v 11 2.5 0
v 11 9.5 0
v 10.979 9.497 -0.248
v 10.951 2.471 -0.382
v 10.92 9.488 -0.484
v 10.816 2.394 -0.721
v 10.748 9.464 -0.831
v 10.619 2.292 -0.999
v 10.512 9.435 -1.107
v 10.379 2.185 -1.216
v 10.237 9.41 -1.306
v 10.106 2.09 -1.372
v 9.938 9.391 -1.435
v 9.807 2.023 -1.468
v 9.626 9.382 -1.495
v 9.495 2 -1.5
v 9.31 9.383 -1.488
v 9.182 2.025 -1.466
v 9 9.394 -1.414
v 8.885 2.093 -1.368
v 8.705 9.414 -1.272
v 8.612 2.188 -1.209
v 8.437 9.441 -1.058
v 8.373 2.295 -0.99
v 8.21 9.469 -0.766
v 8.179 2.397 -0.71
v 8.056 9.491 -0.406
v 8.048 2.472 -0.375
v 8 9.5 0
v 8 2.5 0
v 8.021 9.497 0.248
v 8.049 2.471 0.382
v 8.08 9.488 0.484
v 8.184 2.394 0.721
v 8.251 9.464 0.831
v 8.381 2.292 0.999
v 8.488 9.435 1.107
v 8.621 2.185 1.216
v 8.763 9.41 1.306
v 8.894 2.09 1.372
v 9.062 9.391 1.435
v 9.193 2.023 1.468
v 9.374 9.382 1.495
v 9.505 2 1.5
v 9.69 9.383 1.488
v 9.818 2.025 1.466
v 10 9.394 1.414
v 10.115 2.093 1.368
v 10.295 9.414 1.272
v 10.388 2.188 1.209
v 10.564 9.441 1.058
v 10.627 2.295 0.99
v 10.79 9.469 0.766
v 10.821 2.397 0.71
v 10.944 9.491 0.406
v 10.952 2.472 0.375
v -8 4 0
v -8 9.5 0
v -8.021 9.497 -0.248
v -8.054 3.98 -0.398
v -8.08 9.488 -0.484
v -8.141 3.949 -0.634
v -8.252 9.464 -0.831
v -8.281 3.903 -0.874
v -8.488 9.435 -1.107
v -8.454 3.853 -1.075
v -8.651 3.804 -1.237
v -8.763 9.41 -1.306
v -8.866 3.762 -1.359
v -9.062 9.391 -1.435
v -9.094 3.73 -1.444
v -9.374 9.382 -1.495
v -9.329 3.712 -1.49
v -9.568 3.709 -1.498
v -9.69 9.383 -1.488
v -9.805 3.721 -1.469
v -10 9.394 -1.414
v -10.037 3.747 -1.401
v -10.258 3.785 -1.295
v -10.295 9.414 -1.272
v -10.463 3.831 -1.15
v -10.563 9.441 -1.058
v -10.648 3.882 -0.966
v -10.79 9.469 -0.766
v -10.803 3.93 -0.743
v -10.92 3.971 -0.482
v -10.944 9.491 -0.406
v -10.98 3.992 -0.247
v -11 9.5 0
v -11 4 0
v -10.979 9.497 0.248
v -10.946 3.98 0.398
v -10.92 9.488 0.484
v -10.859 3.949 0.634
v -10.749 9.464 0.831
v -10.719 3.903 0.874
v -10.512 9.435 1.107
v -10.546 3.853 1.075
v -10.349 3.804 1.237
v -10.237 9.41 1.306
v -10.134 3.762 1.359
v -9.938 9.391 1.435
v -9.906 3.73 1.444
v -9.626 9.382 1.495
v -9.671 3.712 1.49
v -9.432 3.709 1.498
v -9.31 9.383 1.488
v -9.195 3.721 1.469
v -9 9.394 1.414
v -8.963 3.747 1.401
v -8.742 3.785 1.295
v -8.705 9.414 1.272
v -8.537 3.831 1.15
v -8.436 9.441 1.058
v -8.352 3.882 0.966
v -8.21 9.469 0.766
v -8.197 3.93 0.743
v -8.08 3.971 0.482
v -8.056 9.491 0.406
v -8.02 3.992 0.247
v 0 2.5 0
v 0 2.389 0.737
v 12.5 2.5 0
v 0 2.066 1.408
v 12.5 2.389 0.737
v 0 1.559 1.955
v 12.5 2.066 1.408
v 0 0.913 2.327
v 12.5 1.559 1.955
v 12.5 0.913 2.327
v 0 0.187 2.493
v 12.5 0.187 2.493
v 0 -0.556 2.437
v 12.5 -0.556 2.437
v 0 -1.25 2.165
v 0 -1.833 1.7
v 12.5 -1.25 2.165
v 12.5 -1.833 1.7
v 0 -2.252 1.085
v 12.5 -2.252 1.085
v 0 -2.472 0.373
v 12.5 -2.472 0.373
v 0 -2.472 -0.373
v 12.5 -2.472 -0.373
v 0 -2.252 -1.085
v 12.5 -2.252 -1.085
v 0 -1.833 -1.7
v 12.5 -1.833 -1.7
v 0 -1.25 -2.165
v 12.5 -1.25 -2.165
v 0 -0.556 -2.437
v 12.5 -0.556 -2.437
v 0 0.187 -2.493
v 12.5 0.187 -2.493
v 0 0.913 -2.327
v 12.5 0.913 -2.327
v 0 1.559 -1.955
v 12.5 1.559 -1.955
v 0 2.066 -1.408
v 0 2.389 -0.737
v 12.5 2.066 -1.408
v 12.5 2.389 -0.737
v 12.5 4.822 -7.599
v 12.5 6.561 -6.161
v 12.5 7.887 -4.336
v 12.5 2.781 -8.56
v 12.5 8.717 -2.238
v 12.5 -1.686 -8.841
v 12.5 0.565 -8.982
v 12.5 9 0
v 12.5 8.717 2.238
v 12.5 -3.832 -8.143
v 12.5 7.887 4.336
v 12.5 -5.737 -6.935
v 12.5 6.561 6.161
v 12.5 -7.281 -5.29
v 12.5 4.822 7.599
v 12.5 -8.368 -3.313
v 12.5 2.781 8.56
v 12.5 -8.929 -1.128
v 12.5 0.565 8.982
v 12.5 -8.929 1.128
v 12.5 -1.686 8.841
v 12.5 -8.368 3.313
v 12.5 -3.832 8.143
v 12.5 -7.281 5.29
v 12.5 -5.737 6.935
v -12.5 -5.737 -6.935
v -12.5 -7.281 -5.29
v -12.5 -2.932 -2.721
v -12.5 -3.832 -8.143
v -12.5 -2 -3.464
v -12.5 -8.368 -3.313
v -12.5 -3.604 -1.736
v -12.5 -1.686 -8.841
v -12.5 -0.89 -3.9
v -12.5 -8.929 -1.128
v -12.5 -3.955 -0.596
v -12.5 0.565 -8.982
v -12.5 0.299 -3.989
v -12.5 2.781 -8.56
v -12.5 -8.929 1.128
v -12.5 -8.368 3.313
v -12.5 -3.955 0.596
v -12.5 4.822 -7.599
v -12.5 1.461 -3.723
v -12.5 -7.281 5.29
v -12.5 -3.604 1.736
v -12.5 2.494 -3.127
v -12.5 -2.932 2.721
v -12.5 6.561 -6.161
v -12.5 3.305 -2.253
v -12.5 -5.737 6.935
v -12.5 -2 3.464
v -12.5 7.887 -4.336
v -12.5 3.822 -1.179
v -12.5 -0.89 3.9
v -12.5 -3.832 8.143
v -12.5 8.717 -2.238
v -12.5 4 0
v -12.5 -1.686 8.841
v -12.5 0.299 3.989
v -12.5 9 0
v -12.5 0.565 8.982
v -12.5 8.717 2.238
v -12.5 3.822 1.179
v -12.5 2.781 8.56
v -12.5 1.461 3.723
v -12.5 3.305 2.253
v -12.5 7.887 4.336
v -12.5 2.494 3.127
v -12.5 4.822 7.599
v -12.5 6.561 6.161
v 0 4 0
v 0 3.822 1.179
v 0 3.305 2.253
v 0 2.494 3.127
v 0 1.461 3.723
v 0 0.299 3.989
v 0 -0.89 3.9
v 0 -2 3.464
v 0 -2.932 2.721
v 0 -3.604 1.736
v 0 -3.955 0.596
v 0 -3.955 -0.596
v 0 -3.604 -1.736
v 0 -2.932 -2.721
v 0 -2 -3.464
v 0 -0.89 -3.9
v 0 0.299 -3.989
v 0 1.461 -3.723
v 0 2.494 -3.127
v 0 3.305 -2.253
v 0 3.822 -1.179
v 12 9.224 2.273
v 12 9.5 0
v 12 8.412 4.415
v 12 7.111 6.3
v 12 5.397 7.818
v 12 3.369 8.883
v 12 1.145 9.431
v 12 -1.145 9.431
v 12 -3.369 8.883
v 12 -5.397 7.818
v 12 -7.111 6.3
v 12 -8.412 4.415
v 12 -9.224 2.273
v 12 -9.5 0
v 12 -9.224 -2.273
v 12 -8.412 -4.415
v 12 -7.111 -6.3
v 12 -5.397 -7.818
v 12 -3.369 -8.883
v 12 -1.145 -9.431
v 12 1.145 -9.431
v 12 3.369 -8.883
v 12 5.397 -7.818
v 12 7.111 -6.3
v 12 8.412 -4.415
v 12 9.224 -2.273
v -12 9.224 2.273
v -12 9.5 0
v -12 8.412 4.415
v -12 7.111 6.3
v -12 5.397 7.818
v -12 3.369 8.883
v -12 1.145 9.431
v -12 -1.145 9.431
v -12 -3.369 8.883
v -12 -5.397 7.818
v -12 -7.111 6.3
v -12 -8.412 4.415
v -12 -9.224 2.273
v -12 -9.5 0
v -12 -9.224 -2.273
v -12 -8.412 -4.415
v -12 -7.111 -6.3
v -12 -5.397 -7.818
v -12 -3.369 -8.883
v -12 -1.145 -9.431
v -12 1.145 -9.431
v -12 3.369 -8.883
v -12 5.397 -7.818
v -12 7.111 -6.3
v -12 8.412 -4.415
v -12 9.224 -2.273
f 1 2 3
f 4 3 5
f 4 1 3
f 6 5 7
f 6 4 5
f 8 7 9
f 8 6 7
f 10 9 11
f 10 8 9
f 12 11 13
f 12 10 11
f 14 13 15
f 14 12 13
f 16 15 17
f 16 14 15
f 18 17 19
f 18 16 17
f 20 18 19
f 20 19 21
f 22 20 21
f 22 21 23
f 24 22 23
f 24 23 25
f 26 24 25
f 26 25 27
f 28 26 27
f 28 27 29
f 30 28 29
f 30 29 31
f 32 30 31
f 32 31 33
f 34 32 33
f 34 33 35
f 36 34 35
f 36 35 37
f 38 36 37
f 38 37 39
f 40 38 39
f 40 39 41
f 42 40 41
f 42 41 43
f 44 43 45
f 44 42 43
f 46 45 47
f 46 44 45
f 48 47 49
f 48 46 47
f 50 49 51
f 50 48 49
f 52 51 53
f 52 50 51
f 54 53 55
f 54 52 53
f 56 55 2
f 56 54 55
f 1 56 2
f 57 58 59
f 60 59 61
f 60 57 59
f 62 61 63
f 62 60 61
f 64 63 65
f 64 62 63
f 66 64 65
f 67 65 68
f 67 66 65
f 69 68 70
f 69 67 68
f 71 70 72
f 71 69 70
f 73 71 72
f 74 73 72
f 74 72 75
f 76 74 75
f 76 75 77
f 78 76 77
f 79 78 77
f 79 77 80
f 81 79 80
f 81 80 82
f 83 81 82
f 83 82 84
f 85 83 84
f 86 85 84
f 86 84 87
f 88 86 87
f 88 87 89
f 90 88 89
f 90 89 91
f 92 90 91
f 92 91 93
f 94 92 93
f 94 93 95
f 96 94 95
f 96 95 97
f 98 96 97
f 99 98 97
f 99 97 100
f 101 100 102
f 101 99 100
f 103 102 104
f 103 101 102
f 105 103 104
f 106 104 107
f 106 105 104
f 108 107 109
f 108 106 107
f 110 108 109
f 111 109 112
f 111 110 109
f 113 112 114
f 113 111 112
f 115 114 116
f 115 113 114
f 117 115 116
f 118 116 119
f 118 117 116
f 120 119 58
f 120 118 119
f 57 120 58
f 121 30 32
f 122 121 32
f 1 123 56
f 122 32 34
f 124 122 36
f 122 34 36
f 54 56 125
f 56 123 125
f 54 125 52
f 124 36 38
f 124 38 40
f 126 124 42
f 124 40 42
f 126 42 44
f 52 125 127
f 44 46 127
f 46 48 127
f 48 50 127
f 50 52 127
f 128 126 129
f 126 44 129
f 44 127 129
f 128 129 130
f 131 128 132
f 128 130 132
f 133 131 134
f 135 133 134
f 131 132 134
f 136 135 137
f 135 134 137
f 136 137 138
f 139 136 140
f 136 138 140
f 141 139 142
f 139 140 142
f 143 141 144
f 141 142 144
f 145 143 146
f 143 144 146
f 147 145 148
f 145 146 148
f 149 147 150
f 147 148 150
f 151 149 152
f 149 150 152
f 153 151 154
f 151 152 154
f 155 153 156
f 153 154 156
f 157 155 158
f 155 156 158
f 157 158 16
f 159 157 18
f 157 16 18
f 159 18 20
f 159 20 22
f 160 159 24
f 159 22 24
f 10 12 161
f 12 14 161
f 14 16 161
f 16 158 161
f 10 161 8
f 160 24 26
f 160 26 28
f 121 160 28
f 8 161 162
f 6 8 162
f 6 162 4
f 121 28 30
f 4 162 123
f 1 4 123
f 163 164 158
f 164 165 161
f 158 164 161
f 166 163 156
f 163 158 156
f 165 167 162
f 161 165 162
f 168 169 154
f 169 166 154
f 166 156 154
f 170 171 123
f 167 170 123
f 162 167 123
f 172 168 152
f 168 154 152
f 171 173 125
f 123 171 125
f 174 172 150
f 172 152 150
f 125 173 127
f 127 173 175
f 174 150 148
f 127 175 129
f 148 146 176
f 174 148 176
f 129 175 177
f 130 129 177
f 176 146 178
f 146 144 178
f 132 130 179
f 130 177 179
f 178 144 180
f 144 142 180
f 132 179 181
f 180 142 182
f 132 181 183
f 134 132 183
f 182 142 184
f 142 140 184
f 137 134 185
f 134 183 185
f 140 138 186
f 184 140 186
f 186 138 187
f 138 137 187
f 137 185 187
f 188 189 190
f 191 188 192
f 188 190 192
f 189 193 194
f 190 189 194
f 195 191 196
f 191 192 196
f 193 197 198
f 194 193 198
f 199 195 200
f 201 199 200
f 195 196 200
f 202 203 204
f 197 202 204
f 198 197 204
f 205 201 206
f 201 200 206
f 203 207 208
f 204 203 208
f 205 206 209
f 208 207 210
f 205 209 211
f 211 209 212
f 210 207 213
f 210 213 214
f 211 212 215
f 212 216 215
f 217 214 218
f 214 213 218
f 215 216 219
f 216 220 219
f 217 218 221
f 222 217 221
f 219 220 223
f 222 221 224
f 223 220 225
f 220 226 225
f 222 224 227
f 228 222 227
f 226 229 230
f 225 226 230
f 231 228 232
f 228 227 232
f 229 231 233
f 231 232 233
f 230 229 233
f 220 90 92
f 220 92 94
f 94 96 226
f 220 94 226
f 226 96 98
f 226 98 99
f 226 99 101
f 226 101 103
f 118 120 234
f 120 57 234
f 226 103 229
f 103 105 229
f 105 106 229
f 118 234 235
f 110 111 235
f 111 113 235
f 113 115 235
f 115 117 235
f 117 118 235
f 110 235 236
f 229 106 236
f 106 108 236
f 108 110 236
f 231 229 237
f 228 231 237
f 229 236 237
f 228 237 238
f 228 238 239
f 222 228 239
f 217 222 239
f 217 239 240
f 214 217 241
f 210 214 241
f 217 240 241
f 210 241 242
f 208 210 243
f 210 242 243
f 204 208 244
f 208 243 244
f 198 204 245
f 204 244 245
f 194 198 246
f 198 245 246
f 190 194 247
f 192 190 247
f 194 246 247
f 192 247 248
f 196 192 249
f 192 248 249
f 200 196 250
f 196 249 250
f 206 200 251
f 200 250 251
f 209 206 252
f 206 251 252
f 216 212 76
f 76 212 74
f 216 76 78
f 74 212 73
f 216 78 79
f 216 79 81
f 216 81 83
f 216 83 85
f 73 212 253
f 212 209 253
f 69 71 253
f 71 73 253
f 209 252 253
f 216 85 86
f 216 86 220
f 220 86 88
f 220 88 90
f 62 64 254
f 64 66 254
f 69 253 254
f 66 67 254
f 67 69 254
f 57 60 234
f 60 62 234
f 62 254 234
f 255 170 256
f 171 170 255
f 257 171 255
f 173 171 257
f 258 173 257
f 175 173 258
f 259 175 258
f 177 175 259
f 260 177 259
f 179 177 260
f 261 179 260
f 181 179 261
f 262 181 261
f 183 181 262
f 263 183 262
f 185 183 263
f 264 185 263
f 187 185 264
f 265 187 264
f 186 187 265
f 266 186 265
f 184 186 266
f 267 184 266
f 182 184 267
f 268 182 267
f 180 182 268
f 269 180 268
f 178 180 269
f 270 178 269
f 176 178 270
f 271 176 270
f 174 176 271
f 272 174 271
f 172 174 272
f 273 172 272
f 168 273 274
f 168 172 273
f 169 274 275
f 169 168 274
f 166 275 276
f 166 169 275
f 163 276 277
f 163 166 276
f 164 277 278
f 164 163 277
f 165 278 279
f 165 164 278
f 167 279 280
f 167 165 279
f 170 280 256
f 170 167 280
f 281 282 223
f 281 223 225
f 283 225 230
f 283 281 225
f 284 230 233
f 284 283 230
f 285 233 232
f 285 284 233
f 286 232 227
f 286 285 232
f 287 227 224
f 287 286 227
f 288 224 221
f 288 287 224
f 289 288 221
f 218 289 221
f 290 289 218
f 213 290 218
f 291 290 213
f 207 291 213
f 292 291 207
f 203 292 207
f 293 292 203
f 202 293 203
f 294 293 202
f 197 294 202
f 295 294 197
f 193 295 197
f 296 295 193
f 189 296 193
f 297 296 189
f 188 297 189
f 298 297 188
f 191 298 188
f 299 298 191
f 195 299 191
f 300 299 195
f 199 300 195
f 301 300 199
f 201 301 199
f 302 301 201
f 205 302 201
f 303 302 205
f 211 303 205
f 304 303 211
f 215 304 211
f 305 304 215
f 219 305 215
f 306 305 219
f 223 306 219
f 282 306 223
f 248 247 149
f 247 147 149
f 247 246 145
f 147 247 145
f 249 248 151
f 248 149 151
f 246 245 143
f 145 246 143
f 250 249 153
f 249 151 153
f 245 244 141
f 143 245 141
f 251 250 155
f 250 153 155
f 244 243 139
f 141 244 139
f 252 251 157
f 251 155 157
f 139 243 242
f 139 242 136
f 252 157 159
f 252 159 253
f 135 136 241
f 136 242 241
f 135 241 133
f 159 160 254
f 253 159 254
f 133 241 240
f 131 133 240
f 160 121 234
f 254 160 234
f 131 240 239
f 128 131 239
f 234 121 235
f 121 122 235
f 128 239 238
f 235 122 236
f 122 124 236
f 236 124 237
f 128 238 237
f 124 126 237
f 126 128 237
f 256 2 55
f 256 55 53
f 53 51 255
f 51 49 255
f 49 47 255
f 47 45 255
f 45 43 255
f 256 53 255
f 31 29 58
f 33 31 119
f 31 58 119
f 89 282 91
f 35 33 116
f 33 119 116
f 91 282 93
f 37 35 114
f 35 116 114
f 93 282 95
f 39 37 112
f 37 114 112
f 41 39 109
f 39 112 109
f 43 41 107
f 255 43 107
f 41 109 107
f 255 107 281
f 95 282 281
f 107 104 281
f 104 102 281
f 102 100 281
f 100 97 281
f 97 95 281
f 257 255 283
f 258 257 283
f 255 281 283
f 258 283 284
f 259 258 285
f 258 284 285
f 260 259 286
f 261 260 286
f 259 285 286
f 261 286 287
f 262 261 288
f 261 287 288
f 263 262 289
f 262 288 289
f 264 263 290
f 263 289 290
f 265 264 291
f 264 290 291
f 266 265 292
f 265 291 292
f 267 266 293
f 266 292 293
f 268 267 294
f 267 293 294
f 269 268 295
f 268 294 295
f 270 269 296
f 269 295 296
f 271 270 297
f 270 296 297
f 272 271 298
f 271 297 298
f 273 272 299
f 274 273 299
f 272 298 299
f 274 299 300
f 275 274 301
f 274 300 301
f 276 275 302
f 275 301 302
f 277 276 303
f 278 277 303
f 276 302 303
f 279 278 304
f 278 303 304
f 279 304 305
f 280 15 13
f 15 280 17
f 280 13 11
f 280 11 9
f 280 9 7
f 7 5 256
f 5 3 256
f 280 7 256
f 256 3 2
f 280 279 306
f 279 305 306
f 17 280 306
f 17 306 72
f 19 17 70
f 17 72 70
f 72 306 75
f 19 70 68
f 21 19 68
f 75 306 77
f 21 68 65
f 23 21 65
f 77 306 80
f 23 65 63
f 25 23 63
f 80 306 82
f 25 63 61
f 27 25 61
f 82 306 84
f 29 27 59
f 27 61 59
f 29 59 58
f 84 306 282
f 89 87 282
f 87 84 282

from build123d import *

# Parameters (mm, degrees)
CUT_EXTRUDE1_REACH = 11.5
SKETCH2_R          = 1.5
CHAMFER1_SIZE      = 0.5


with BuildPart() as part:
    # Sketch1 → Revolve1 (revolve)
    with BuildSketch(Plane.XY):
        Polygon((-12.5, 4), (0, 4), (0, 2.5), (12.5, 2.5), (12.5, 9.5), (-12.5, 9.5), align=None)
    revolve(axis=Axis((-12.5, 0, 0), (1, 0, 0)))

    # Sketch2 → Cut-Extrude1 (cut, up to next)
    with BuildSketch(Plane(origin=(0, 0, 0), x_dir=(1, 0, 0), z_dir=(0, 1, 0)), mode=Mode.PRIVATE) as cut_extrude1_sk1:
        with Locations((-9.5, 0)):
            Circle(SKETCH2_R)
    cut_extrude1_tool1 = extrude(cut_extrude1_sk1.sketch, amount=CUT_EXTRUDE1_REACH, mode=Mode.PRIVATE) & part.part
    add(cut_extrude1_tool1.solids().sort_by_distance((-9.5, 0, 0))[0], mode=Mode.SUBTRACT)
    # Sketch2 → Cut-Extrude1 (cut, up to next)
    with BuildSketch(Plane(origin=(0, 0, 0), x_dir=(1, 0, 0), z_dir=(0, 1, 0)), mode=Mode.PRIVATE) as cut_extrude1_sk2:
        with Locations((9.5, 0)):
            Circle(SKETCH2_R)
    cut_extrude1_tool2 = extrude(cut_extrude1_sk2.sketch, amount=CUT_EXTRUDE1_REACH, mode=Mode.PRIVATE) & part.part
    add(cut_extrude1_tool2.solids().sort_by_distance((9.5, 0, 0))[0], mode=Mode.SUBTRACT)

    # Chamfer1
    chamfer1_edges = [part.edges().sort_by_distance(p)[0] for p in [
        (-12.5, -9.5, 0),
        (12.5, -9.5, 0),
    ]]
    chamfer(chamfer1_edges, length=CHAMFER1_SIZE)


solid = part.part
